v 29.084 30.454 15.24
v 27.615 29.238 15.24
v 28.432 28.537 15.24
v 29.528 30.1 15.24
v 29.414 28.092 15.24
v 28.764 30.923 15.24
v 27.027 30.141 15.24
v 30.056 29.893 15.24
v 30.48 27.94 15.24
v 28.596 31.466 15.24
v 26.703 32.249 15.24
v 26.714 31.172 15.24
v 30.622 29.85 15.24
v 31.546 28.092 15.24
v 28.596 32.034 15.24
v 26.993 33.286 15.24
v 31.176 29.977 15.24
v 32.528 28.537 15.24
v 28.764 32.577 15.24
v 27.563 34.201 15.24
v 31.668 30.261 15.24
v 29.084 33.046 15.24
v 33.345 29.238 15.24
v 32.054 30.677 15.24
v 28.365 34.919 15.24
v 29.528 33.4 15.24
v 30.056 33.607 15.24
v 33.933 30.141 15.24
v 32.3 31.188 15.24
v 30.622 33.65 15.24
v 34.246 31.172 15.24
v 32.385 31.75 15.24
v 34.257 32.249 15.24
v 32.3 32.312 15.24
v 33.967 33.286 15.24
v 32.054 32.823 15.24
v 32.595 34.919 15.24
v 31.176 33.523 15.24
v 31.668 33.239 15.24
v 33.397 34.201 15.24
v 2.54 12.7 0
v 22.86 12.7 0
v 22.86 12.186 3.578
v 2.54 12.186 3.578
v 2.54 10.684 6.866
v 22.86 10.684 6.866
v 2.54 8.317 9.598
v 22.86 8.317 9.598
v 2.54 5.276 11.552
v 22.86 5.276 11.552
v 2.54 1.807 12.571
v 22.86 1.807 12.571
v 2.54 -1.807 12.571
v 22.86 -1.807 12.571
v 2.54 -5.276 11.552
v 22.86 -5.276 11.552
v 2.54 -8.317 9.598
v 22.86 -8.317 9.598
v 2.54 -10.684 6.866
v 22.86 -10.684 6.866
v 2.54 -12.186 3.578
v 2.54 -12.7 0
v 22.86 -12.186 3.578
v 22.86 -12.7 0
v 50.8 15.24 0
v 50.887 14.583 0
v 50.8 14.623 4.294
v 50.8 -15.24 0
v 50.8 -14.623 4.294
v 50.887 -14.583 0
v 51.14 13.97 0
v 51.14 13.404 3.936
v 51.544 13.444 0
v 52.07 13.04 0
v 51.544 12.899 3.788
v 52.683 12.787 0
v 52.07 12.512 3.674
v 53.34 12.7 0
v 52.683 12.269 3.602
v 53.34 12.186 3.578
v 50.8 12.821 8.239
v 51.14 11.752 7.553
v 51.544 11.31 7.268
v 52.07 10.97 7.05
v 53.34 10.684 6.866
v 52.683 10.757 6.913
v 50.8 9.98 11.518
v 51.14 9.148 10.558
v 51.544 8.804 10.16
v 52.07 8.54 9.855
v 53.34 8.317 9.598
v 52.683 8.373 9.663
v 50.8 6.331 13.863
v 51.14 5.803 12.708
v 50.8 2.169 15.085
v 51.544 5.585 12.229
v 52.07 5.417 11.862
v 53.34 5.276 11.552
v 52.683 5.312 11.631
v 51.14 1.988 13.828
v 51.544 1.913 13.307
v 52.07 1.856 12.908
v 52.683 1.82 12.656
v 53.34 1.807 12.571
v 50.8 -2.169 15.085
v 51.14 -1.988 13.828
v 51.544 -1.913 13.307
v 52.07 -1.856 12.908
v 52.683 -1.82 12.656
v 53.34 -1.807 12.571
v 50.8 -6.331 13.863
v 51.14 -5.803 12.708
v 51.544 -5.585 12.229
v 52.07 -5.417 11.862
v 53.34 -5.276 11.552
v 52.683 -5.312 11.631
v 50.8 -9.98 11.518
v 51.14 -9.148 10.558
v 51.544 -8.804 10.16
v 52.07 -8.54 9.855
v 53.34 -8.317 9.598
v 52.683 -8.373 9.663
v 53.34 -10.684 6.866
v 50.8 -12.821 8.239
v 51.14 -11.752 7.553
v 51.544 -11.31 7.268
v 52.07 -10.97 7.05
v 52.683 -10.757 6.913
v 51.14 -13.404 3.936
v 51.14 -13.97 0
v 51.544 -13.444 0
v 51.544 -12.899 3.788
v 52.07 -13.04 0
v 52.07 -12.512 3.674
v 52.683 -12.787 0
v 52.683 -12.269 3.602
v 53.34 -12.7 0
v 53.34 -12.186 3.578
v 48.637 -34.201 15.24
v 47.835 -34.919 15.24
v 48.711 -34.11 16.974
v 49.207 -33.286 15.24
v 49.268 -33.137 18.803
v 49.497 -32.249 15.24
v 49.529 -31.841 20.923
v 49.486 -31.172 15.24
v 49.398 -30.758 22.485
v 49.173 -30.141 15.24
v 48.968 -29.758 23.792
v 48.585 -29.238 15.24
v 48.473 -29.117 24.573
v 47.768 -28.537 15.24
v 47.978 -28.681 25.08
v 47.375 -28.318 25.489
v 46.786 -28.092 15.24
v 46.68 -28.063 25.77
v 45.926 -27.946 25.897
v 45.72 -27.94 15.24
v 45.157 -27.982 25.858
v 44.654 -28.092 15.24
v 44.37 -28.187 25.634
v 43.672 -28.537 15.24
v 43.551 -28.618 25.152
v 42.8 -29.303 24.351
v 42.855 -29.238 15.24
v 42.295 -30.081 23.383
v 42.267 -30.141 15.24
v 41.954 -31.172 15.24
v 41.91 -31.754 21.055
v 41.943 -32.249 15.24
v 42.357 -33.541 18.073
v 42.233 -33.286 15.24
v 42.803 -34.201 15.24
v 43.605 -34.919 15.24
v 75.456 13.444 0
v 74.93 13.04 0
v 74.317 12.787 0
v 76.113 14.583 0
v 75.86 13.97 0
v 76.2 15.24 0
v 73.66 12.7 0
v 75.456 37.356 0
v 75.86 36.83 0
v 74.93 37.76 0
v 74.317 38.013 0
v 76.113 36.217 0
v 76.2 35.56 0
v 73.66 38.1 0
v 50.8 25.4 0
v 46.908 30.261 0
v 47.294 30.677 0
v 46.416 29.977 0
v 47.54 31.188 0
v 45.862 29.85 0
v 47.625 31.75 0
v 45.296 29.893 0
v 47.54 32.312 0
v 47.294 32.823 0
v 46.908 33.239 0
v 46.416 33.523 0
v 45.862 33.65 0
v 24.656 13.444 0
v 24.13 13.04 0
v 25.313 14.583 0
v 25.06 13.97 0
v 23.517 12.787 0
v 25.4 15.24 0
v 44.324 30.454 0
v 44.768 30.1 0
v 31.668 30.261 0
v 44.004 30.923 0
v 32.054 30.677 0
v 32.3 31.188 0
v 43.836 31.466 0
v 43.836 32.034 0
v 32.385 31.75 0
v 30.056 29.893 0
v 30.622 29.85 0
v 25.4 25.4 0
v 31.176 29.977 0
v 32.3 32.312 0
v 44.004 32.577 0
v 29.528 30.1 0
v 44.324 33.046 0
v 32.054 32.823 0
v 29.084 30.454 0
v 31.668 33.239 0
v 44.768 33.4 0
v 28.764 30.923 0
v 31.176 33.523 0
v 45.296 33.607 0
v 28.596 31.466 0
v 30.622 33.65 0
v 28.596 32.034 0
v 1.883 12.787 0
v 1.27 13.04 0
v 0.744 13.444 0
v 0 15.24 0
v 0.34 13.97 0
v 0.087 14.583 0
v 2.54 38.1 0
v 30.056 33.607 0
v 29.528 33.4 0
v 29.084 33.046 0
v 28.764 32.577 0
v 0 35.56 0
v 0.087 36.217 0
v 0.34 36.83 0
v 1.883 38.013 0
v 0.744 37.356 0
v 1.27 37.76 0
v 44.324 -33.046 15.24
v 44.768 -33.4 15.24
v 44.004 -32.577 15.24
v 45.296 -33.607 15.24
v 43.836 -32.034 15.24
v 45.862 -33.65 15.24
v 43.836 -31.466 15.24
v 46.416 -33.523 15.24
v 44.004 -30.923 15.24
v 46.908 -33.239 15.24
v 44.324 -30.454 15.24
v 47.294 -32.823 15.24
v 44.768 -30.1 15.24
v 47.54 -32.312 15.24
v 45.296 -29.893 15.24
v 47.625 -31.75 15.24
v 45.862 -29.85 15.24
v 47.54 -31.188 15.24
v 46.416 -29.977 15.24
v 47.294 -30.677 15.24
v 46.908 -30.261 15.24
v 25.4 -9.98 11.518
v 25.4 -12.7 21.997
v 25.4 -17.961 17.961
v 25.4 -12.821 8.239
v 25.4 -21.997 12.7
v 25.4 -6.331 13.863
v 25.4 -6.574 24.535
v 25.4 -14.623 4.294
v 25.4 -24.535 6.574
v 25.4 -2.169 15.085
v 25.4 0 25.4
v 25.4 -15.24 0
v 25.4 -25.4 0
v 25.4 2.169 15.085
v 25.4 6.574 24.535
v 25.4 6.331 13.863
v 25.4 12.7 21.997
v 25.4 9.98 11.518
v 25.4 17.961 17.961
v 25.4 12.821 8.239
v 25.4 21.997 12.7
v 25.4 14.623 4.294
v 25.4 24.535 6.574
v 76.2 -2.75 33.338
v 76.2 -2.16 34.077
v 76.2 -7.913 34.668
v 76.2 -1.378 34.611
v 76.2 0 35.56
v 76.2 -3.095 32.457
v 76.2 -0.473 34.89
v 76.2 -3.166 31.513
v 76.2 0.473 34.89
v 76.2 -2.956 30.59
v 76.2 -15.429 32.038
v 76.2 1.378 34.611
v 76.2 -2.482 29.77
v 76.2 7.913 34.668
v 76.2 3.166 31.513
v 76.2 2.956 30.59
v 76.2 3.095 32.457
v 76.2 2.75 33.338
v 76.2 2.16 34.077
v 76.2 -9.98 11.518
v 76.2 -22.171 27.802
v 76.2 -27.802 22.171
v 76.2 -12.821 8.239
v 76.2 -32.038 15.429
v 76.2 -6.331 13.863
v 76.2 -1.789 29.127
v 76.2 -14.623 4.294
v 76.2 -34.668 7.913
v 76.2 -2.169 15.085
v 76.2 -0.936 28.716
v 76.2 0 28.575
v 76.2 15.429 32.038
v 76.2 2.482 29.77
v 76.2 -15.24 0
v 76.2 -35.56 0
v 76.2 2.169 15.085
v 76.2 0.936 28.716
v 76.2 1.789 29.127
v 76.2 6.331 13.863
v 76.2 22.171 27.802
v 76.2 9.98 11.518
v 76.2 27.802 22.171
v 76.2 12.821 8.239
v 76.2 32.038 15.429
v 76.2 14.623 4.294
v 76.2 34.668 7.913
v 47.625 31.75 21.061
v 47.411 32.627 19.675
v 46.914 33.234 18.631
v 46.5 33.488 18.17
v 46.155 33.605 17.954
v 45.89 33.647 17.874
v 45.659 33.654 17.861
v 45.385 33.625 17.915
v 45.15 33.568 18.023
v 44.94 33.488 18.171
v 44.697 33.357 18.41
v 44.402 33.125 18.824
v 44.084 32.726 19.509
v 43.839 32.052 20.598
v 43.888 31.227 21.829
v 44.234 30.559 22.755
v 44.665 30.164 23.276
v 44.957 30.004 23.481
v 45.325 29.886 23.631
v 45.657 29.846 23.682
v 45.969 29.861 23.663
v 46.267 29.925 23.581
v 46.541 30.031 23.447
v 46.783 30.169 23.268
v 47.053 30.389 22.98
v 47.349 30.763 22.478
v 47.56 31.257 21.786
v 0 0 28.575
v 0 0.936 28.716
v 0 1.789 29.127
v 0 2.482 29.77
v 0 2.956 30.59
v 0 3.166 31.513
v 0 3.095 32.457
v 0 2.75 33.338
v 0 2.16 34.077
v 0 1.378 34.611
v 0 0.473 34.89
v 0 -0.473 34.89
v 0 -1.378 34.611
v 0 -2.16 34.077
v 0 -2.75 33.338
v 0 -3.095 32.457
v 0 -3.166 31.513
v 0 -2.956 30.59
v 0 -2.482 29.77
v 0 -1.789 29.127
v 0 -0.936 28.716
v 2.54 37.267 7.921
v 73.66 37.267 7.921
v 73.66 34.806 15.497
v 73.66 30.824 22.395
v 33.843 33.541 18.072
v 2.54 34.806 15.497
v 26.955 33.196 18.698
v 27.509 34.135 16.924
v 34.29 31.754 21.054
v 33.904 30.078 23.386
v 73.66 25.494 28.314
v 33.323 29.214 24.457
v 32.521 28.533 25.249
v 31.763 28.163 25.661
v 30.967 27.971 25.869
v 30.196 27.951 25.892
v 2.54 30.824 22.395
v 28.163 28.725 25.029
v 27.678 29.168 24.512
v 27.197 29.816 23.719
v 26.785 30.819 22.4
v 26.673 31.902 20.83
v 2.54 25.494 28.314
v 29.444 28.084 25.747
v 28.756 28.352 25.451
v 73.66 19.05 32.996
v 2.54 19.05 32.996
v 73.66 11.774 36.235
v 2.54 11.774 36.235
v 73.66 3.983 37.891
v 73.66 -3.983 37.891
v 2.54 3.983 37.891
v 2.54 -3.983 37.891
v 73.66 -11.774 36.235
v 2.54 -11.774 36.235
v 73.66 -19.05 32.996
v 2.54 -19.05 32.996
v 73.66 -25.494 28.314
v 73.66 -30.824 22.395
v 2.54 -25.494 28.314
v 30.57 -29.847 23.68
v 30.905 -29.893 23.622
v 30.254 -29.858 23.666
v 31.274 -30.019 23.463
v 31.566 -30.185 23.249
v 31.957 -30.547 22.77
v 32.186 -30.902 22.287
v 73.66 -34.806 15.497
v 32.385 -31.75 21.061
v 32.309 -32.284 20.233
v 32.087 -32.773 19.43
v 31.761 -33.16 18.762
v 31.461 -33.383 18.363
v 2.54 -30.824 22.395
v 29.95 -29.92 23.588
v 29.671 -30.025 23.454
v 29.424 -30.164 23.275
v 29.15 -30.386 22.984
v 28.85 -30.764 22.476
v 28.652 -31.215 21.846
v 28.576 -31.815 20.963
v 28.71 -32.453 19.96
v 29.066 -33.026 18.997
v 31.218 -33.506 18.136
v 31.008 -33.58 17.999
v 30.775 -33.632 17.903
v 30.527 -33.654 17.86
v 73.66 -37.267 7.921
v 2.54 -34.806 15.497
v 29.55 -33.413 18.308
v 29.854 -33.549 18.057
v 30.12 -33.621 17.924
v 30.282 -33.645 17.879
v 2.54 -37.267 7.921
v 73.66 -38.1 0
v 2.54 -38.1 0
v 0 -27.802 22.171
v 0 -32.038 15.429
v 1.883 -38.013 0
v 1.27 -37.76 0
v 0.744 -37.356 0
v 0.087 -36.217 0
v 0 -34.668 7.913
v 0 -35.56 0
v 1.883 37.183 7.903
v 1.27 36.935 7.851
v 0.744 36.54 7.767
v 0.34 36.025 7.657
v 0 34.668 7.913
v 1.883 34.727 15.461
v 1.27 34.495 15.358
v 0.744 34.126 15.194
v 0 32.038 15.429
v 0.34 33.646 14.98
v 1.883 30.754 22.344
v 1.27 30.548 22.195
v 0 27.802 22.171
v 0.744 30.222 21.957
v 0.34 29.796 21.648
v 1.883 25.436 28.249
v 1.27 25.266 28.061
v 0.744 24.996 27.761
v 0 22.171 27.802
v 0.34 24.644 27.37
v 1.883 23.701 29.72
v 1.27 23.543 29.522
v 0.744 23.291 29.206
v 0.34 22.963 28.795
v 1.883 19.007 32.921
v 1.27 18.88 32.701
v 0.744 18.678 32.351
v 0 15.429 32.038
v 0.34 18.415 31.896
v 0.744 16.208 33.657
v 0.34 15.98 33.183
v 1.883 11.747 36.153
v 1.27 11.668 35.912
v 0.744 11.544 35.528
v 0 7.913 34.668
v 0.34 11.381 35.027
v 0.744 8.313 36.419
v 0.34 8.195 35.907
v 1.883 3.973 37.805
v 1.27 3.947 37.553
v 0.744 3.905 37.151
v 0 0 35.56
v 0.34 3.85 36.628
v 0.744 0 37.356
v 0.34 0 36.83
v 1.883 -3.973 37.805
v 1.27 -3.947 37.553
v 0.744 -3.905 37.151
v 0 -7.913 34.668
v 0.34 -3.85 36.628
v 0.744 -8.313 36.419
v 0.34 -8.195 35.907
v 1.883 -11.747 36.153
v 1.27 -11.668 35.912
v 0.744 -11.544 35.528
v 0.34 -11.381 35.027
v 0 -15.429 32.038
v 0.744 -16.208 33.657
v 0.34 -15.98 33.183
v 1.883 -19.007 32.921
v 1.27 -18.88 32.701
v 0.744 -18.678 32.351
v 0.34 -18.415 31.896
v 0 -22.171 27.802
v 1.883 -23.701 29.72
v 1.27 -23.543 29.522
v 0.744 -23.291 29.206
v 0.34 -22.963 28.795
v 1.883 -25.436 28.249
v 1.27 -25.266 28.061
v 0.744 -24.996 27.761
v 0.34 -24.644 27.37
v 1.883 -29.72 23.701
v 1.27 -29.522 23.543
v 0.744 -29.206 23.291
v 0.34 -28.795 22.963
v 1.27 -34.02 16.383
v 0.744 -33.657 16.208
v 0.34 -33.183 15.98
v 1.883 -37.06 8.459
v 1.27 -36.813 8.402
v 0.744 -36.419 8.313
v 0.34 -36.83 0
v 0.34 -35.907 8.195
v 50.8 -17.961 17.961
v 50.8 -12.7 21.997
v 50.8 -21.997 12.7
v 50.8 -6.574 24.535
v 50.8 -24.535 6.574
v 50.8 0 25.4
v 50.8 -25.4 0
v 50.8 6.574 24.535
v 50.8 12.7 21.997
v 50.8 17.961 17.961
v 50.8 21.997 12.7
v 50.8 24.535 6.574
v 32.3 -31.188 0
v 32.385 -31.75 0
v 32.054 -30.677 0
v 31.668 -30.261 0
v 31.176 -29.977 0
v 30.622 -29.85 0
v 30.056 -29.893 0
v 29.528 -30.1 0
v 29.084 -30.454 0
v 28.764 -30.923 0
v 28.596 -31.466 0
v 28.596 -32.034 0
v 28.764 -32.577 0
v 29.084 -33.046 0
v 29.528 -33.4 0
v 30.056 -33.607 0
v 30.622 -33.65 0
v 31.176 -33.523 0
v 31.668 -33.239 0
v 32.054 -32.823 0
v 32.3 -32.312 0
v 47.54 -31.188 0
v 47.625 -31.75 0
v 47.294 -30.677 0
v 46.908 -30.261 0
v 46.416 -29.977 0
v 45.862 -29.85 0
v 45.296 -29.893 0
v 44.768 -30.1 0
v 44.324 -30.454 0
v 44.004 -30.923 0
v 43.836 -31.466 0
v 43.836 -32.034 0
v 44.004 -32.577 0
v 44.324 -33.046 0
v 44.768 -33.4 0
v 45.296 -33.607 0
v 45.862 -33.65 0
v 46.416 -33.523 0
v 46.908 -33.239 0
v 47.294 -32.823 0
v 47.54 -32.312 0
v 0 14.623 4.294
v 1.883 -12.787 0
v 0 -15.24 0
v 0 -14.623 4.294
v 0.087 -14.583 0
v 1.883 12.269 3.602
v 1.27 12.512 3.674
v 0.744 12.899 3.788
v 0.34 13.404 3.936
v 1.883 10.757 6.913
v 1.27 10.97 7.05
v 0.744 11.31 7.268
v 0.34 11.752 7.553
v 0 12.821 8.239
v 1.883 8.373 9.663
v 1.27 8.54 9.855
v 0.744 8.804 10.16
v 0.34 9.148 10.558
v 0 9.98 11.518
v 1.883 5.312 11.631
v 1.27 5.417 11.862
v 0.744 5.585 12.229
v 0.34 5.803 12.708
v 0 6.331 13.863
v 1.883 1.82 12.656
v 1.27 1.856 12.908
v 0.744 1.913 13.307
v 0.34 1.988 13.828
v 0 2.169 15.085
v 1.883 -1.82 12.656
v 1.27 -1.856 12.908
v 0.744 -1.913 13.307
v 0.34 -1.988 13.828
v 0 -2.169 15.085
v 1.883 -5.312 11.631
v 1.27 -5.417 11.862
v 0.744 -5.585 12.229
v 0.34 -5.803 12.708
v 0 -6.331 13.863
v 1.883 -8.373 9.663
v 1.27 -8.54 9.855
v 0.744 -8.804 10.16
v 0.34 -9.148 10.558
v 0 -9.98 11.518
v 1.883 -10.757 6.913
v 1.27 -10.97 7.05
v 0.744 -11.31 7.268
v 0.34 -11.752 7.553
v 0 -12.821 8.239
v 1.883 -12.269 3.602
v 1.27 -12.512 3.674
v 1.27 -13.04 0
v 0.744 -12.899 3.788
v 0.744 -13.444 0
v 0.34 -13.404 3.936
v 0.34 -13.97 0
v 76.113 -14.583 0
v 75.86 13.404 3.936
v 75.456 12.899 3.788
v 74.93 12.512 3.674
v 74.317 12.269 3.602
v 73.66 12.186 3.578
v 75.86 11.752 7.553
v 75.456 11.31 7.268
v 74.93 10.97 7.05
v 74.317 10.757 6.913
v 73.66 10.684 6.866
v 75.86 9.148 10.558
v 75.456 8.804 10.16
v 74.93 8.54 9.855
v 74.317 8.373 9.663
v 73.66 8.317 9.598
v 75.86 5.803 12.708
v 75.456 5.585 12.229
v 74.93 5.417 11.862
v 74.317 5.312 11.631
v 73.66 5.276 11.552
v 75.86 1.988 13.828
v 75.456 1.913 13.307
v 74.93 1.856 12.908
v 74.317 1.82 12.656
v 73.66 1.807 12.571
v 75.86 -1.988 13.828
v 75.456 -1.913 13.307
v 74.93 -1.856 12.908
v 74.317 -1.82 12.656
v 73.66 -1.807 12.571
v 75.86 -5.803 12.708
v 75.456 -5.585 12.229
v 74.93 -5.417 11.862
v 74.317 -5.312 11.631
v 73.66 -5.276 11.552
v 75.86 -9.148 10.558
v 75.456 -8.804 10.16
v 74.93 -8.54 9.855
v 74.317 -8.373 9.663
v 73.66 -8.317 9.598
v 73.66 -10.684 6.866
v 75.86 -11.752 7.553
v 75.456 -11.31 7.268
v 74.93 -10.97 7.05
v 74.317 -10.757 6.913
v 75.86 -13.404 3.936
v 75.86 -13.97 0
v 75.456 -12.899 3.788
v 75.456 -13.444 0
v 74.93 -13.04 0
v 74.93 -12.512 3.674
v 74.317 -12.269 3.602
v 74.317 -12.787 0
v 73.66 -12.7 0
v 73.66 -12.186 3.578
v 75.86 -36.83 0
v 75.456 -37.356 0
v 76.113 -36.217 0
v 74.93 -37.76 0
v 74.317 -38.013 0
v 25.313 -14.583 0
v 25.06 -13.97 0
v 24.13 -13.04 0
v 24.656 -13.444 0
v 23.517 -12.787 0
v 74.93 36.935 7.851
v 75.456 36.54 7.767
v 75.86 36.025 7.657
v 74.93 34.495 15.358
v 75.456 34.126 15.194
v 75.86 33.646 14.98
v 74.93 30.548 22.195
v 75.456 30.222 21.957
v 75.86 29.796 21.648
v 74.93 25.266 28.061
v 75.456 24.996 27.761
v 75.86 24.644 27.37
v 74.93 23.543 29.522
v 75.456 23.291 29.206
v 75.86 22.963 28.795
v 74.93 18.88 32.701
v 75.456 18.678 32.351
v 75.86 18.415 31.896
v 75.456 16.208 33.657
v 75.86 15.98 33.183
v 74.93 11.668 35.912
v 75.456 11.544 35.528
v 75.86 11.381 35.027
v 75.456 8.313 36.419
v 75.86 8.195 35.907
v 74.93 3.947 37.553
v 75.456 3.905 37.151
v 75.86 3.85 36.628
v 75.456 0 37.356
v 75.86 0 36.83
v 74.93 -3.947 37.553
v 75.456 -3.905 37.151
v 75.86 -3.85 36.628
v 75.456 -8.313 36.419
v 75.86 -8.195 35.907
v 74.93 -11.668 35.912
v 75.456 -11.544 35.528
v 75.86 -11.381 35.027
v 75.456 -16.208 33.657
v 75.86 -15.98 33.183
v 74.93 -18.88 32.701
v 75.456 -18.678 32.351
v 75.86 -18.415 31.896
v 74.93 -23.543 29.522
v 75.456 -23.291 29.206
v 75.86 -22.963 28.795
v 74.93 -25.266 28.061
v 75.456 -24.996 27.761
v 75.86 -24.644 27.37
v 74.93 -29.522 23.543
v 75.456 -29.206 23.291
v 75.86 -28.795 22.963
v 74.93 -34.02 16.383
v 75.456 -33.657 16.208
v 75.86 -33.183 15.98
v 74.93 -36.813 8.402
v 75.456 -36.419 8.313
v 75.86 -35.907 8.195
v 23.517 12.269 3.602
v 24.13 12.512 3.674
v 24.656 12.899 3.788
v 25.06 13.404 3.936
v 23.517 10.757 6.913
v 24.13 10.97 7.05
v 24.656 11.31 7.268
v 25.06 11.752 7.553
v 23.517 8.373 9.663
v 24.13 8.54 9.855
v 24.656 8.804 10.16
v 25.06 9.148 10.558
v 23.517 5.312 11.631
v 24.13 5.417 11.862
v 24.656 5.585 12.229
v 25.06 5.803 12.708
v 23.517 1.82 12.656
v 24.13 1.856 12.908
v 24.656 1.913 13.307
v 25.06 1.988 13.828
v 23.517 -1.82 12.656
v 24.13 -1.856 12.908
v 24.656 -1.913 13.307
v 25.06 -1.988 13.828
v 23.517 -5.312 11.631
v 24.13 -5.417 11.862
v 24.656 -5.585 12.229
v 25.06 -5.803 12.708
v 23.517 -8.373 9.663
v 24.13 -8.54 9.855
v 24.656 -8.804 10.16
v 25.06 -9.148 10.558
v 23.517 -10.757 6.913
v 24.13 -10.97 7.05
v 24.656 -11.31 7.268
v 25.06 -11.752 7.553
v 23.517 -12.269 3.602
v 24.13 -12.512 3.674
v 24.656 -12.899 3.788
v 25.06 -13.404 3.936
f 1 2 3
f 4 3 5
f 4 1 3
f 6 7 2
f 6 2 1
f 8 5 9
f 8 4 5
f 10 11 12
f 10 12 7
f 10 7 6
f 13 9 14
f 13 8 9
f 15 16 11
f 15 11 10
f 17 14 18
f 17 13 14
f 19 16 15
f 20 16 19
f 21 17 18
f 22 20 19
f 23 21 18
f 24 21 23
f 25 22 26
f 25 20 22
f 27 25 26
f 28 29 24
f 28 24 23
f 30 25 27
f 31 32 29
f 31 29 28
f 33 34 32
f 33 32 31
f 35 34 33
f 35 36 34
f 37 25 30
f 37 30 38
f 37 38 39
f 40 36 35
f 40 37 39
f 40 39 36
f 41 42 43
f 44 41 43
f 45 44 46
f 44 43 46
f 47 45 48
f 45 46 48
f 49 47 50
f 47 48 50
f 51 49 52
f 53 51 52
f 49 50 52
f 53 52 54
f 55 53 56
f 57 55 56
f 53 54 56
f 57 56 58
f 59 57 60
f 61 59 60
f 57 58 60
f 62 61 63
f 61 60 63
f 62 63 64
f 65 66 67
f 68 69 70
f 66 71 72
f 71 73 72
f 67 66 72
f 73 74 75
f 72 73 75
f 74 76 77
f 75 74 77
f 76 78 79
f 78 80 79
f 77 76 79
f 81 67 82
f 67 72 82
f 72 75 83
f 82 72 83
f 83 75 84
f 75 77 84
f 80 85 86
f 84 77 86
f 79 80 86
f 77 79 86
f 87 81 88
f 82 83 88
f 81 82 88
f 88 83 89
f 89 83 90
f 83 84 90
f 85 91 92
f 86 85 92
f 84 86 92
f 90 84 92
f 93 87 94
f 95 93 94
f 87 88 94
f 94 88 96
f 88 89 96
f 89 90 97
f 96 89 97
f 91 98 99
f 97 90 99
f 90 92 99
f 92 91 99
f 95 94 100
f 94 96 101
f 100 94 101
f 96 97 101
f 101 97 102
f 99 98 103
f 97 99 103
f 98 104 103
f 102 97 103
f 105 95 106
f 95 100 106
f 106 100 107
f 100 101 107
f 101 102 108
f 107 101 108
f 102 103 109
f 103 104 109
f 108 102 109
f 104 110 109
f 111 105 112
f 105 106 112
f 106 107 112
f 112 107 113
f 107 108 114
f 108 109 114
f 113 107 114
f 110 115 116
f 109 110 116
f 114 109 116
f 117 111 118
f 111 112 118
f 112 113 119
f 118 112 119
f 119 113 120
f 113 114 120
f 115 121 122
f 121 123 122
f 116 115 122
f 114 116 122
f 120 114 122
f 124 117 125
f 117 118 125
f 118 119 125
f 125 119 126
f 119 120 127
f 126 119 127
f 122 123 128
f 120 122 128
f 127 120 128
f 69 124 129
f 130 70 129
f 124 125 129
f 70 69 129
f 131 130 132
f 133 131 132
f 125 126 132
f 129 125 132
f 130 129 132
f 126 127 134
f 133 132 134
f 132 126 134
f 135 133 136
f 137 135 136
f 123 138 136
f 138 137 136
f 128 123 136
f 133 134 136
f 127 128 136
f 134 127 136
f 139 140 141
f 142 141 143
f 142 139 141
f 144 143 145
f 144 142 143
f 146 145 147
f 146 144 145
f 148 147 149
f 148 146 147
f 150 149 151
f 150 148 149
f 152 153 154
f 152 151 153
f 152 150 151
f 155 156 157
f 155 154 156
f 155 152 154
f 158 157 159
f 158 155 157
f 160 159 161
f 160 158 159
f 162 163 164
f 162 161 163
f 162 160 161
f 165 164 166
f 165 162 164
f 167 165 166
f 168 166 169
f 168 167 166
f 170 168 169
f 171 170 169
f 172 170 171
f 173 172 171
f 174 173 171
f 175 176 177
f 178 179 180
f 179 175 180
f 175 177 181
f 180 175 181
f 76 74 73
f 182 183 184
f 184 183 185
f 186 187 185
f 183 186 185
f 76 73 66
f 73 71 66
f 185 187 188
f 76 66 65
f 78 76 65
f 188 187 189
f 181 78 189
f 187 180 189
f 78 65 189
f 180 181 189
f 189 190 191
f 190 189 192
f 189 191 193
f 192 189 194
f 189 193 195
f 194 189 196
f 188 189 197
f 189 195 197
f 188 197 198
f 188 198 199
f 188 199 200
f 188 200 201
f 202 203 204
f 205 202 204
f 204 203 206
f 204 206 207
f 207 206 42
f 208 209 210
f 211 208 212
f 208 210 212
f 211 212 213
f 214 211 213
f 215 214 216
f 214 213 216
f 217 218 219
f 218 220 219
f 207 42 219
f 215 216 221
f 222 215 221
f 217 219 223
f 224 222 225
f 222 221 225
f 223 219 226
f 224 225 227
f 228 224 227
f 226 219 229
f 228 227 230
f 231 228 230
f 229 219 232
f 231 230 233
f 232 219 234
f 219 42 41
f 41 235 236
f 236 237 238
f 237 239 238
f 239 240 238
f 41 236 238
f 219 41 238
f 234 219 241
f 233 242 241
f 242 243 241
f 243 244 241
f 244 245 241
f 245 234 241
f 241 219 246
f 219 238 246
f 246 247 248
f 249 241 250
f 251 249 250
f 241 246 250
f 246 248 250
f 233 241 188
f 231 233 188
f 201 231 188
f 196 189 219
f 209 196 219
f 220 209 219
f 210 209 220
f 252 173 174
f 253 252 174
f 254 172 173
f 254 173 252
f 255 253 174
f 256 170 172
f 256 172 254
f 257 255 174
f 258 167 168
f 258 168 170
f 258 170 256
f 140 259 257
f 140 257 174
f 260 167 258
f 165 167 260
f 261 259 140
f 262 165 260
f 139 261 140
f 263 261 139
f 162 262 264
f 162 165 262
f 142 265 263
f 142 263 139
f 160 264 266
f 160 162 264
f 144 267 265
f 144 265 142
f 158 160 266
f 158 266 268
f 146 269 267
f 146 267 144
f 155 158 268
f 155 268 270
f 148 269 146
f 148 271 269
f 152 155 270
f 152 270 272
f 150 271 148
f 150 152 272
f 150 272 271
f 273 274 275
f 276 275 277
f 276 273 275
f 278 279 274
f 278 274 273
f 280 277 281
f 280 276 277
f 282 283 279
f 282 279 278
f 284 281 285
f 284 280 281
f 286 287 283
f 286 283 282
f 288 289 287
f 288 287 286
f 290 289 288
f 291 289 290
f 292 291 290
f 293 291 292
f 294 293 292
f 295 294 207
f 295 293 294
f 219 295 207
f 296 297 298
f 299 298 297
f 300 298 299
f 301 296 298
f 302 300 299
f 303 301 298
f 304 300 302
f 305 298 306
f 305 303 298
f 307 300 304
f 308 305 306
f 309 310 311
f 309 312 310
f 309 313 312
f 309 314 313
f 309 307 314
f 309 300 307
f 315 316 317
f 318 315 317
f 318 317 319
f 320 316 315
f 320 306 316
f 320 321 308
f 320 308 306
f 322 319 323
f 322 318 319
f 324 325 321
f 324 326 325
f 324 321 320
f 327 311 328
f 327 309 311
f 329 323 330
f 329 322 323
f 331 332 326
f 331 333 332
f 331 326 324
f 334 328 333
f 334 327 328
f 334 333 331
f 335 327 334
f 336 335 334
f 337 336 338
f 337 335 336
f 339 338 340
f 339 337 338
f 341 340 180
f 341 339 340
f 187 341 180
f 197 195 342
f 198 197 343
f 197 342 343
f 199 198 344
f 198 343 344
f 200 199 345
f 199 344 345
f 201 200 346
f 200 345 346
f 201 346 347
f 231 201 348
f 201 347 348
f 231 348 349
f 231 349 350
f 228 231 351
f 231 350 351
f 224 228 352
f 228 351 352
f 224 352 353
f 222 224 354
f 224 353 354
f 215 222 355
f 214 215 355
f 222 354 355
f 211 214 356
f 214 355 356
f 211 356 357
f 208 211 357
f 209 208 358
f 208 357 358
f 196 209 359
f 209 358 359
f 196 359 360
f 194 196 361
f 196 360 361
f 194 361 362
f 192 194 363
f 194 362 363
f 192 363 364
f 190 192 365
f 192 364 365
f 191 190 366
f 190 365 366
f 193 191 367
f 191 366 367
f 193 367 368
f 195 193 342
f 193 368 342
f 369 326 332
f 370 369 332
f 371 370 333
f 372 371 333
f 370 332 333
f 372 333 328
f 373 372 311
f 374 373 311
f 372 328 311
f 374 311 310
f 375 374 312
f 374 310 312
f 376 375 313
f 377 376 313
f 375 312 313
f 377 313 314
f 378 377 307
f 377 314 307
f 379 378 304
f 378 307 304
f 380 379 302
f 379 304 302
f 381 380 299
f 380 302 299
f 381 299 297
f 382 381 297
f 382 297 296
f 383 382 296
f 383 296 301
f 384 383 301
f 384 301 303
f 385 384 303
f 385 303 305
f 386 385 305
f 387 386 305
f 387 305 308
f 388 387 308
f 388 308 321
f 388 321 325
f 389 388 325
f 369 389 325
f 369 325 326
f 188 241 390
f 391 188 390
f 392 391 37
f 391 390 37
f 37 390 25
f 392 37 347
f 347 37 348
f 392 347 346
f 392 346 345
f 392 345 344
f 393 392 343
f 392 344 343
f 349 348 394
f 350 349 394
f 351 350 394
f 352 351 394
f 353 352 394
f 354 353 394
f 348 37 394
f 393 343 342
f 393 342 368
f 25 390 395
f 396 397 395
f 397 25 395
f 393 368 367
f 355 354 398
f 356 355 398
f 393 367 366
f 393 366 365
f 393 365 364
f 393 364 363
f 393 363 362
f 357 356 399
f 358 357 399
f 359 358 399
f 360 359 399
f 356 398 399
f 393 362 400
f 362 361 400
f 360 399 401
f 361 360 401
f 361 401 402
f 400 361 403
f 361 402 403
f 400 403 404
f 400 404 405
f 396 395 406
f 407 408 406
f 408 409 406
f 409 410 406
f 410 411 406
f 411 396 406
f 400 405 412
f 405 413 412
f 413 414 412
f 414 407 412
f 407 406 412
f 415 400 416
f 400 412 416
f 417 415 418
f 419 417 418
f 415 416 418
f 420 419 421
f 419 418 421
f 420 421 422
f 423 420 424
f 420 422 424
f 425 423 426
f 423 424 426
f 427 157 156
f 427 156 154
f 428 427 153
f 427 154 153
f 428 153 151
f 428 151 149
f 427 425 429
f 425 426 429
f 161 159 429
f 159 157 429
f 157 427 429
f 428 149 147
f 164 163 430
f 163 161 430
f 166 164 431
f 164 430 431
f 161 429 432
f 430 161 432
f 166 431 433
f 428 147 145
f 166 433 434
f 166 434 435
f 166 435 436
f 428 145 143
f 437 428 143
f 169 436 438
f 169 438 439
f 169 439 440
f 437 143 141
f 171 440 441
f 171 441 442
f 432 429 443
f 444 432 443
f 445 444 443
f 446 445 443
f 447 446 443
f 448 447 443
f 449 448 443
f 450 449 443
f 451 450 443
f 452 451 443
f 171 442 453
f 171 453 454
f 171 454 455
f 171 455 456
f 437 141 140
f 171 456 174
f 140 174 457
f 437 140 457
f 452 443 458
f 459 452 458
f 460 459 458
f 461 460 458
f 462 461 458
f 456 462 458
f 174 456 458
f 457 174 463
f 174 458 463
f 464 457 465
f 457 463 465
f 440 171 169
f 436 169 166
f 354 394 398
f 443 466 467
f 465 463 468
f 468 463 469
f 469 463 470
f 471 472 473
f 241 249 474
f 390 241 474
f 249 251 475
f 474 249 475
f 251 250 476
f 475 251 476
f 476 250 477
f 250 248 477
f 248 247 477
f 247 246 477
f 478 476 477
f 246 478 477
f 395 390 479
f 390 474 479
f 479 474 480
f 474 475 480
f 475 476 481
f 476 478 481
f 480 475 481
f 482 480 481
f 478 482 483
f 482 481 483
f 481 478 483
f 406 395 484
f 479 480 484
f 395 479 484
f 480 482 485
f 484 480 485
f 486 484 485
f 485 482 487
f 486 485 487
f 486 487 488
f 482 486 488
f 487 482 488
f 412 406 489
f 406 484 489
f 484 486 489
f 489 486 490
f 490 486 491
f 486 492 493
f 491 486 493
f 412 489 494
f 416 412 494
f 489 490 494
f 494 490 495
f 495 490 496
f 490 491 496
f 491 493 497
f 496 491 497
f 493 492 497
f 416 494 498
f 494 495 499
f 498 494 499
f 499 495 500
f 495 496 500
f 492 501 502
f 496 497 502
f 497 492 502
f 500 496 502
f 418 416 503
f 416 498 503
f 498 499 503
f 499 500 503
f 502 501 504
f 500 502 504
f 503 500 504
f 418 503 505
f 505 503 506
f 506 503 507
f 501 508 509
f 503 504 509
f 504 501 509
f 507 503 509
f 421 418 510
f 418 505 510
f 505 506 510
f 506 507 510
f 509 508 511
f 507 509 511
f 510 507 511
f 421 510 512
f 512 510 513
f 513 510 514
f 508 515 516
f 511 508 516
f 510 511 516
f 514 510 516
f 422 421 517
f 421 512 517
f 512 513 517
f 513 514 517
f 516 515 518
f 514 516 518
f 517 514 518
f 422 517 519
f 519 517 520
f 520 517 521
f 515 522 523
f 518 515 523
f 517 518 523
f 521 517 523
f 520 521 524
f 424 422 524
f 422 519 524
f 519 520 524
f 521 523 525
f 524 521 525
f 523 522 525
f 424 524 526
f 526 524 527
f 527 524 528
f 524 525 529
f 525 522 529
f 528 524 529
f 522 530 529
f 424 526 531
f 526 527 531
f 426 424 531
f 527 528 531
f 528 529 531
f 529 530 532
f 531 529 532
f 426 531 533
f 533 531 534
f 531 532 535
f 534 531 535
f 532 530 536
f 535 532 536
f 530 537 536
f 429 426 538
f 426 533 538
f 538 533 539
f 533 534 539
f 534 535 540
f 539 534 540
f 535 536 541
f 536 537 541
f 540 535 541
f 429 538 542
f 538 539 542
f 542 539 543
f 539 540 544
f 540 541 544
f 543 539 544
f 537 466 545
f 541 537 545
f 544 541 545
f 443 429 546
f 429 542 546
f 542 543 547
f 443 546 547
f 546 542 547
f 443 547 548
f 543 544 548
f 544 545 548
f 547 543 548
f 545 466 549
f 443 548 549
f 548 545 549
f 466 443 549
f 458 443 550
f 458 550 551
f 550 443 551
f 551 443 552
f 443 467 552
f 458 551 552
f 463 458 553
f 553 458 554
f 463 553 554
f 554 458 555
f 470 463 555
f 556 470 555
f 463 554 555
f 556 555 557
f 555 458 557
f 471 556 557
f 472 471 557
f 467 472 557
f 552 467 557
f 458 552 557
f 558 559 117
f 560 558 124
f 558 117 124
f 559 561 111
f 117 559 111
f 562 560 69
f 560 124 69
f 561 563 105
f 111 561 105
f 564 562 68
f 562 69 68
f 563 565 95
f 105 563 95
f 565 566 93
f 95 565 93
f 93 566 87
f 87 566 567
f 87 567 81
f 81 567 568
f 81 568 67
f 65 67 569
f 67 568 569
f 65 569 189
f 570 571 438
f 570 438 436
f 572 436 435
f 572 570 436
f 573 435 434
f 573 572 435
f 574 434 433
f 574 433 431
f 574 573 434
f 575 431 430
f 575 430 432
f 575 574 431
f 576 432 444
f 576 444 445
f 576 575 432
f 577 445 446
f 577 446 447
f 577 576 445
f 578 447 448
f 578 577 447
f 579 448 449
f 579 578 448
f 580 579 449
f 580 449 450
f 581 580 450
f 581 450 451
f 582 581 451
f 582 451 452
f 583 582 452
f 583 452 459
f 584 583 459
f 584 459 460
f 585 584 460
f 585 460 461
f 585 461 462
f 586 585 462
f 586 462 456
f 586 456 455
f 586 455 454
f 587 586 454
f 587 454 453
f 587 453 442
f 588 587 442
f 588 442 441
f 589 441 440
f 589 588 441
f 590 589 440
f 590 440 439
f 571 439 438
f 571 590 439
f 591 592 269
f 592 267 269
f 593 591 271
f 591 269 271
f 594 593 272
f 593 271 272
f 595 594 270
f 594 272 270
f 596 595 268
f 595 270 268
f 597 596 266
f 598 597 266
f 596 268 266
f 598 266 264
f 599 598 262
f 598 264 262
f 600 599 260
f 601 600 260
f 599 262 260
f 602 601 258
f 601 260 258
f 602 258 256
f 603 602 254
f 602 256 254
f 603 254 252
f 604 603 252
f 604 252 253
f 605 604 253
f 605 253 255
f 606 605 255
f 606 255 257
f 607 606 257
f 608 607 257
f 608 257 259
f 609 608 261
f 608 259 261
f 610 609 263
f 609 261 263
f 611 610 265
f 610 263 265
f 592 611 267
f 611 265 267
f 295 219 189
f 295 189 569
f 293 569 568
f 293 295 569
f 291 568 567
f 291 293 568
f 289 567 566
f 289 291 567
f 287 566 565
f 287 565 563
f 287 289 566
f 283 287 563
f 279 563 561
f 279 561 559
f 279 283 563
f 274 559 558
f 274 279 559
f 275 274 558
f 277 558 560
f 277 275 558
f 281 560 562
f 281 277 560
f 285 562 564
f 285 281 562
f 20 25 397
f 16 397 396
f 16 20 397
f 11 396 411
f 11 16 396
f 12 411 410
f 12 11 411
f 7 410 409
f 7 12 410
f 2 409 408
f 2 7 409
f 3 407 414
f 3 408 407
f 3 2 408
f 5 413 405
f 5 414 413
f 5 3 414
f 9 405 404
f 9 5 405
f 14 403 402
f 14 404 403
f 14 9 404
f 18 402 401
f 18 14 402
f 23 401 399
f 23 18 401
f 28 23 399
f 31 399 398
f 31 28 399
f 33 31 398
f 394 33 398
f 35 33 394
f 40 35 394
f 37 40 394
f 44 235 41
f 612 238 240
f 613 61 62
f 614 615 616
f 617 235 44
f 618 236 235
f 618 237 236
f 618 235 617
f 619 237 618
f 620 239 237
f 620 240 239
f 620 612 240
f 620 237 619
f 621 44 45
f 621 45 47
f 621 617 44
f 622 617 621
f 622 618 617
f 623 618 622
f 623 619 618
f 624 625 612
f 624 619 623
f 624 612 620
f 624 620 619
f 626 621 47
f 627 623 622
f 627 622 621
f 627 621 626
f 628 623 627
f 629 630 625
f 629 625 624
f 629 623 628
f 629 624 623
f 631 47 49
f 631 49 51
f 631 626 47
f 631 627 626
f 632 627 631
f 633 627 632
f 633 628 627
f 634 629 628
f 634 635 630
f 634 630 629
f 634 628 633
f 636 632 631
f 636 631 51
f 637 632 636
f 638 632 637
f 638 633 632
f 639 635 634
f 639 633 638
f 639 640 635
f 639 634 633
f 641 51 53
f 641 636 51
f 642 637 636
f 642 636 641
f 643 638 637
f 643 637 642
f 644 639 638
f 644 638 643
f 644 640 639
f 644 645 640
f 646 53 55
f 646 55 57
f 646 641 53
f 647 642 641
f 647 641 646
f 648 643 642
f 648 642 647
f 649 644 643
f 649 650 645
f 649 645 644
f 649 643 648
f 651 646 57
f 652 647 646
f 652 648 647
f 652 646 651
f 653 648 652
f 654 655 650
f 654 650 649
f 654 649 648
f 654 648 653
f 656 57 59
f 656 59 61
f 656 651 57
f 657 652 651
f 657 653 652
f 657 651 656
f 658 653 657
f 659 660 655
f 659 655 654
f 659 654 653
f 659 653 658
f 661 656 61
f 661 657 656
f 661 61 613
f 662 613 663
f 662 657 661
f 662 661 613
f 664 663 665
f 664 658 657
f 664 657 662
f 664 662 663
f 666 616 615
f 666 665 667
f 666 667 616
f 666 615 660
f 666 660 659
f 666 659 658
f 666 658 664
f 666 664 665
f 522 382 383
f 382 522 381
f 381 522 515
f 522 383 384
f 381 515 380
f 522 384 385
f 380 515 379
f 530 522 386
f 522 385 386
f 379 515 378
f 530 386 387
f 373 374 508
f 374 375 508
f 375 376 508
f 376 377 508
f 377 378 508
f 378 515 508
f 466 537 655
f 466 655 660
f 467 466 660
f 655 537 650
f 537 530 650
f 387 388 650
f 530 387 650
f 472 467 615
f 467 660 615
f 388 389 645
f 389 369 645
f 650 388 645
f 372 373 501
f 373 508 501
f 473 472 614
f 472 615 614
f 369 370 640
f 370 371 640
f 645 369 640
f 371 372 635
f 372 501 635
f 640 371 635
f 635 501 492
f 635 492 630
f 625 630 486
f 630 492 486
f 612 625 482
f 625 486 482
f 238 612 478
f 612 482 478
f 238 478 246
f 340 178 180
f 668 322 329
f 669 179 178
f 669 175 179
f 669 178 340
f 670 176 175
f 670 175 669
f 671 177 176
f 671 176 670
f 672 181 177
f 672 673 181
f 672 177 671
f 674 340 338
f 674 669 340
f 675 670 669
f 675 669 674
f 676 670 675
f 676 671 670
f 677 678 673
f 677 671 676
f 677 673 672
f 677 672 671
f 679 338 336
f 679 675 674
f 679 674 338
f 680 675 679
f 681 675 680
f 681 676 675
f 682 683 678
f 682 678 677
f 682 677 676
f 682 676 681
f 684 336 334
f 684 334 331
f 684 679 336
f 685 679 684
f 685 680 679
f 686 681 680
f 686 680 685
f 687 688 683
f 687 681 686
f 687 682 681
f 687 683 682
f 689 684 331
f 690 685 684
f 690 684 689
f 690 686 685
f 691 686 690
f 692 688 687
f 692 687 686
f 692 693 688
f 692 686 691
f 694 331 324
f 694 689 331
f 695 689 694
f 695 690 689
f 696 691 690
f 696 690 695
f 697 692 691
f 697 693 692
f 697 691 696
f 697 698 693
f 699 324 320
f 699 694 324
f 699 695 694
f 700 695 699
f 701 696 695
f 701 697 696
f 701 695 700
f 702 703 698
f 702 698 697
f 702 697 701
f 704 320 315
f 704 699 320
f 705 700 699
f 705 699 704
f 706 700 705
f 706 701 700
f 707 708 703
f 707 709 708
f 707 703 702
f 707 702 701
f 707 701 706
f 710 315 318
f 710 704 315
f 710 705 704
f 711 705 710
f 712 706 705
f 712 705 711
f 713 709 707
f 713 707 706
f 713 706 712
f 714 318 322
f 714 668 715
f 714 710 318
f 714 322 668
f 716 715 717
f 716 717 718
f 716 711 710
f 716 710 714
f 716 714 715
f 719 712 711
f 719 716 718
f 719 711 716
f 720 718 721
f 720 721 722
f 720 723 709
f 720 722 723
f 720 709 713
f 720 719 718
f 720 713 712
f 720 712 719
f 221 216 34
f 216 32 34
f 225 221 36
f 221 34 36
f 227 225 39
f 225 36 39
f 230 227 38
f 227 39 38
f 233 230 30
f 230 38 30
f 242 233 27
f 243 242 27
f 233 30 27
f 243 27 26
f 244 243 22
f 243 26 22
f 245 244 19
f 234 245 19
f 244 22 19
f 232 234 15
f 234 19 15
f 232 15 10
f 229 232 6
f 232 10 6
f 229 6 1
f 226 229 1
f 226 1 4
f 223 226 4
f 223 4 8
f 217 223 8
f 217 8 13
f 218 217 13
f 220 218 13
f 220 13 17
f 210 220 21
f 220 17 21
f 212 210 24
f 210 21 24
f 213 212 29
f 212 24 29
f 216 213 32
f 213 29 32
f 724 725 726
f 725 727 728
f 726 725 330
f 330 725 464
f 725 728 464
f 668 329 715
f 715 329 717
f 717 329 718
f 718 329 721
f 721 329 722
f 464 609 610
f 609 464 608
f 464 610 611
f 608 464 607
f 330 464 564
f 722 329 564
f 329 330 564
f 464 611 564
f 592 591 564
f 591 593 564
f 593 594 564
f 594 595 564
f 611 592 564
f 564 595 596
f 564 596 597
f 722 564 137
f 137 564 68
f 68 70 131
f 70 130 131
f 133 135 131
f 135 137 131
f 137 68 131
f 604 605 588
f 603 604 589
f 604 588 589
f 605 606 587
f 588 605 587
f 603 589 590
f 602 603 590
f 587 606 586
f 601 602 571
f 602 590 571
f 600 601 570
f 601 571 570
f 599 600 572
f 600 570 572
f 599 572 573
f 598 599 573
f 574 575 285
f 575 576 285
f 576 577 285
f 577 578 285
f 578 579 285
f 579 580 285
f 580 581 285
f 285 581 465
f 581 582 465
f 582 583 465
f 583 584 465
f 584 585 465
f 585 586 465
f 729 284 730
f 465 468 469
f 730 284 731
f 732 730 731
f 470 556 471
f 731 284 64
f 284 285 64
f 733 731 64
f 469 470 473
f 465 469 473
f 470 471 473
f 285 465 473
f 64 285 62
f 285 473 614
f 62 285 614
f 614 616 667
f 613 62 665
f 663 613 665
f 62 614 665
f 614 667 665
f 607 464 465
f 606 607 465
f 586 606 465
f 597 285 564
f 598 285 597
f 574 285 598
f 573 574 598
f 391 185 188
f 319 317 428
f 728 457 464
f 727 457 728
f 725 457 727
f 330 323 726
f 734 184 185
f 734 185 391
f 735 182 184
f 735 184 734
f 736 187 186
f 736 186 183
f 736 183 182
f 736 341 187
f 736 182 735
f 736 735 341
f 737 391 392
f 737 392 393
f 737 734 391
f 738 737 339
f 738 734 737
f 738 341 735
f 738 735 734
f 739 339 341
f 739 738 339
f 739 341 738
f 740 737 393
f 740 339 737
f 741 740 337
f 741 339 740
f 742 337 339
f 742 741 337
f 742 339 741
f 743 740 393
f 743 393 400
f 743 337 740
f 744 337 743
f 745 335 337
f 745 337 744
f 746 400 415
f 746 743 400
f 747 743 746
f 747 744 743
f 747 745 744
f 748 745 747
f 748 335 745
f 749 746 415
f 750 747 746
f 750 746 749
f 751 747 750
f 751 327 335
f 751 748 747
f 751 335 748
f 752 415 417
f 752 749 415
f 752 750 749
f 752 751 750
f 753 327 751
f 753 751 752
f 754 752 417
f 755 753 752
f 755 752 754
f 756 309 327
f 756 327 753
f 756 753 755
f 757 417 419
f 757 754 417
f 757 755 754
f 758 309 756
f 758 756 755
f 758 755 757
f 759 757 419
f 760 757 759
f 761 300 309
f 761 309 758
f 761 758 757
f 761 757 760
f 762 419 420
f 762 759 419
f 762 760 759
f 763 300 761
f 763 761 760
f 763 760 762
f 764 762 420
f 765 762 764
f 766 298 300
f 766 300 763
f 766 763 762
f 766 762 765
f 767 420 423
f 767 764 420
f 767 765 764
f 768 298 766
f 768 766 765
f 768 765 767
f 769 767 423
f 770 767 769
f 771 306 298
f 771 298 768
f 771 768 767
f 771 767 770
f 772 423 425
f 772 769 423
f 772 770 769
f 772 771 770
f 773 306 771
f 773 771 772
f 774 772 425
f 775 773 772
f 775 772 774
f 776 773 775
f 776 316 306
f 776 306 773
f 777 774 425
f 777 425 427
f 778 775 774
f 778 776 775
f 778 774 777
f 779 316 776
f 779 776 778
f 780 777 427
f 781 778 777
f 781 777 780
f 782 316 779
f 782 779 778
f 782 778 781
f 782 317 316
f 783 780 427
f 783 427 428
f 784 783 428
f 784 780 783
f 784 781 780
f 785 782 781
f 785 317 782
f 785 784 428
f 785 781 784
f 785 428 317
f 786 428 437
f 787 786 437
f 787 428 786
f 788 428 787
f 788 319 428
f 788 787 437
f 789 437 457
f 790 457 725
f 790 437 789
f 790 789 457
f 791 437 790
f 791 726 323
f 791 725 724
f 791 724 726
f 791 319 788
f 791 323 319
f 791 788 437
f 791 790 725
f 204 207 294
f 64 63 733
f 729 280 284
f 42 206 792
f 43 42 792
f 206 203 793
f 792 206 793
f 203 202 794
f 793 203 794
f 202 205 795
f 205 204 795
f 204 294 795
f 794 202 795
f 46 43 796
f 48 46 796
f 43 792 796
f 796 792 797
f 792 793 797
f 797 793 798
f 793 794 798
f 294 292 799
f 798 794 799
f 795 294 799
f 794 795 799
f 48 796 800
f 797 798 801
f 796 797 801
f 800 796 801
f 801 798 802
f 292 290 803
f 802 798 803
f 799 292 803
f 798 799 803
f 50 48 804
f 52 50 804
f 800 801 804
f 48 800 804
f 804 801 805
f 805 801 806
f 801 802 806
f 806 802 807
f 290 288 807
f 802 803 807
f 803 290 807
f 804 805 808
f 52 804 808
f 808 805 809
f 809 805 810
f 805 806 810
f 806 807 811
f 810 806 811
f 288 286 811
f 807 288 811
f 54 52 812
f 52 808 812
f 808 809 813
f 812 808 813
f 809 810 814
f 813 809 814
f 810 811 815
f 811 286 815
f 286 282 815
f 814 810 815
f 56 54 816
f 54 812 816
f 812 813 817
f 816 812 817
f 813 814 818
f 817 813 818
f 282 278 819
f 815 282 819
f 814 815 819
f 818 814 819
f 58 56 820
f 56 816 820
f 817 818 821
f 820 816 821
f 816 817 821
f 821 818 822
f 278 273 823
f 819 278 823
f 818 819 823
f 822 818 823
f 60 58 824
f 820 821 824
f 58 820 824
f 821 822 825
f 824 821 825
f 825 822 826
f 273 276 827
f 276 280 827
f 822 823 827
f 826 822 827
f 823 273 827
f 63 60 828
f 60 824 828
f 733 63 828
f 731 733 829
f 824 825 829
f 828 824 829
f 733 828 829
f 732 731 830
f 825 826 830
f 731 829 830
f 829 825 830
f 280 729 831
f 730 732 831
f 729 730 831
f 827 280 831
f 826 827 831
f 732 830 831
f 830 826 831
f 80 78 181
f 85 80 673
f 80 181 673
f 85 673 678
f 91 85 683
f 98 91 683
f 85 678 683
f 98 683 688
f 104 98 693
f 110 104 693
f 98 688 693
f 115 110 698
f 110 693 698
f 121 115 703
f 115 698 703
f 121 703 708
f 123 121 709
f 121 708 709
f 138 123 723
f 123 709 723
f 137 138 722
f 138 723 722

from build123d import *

# Parameters (mm, degrees)
SKETCH1_R               = 38.1
BOSS_EXTRUDE1_DEPTH     = 25.4
SKETCH2_R               = 38.1
SKETCH2_R_2             = 25.4
BOSS_EXTRUDE2_DEPTH     = 25.4
SKETCH3_R               = 38.1
BOSS_EXTRUDE3_DEPTH     = 25.4
SKETCH4_R               = 12.7
CUT_EXTRUDE1_DEPTH      = 77.2
FILLET1_R               = 2.54
SKETCH6_R               = 1.905
CUT_EXTRUDE2_DEPTH      = 39.1000001
CUT_EXTRUDE2_DEPTH_BACK = 39.1000001
SKETCH7_R               = 3.81
CUT_EXTRUDE3_DEPTH      = 25.4
SKETCH8_R               = 3.81
CUT_EXTRUDE4_DEPTH      = 25.4
CUT_EXTRUDE5_REACH      = 78.2
SKETCH9_W               = 50.8
SKETCH9_H               = 76.2
FILLET2_R               = 2.54
SKETCH10_R              = 3.175
CUT_EXTRUDE6_DEPTH      = 77.2
FILLET3_R               = 2.54


with BuildPart() as part:
    # Sketch1 → Boss-Extrude1 (new body)
    with BuildSketch(Plane(origin=(0, 0, 0), x_dir=(0, 0, -1), z_dir=(1, 0, 0))):
        Circle(SKETCH1_R)
    extrude(amount=BOSS_EXTRUDE1_DEPTH)

    # Sketch2 → Boss-Extrude2 (add)
    with BuildSketch(Plane(origin=(25.4, 0, 0), x_dir=(0, 0, -1), z_dir=(1, 0, 0))):
        Circle(SKETCH2_R)
        Circle(SKETCH2_R_2, mode=Mode.SUBTRACT)
    extrude(amount=BOSS_EXTRUDE2_DEPTH)

    # Sketch3 → Boss-Extrude3 (add)
    with BuildSketch(Plane(origin=(50.8, 0, 0), x_dir=(0, 0, -1), z_dir=(1, 0, 0))):
        Circle(SKETCH3_R)
    extrude(amount=BOSS_EXTRUDE3_DEPTH)

    # Sketch4 → Cut-Extrude1 (cut, through all)
    with BuildSketch(Plane(origin=(76.2, 0, 0), x_dir=(0, 0, -1), z_dir=(1, 0, 0))):
        Circle(SKETCH4_R)
    extrude(amount=-CUT_EXTRUDE1_DEPTH, mode=Mode.SUBTRACT)

    # Fillet1
    fillet1_edges = [part.edges().sort_by_distance(p)[0] for p in [
        (76.2, 0, 38.1),
        (0, 0, 38.1),
    ]]
    fillet(fillet1_edges, radius=FILLET1_R)

    # Sketch6 → Cut-Extrude2 (cut, two sides)
    with BuildSketch(Plane.XY) as cut_extrude2_sk:
        with Locations((30.48, 31.75)):
            Circle(SKETCH6_R)
        with Locations((45.72, 31.75)):
            Circle(SKETCH6_R)
        with Locations((30.48, -31.75)):
            Circle(SKETCH6_R)
        with Locations((45.72, -31.75)):
            Circle(SKETCH6_R)
    extrude(amount=CUT_EXTRUDE2_DEPTH, mode=Mode.SUBTRACT)
    extrude(cut_extrude2_sk.sketch, amount=-CUT_EXTRUDE2_DEPTH_BACK, mode=Mode.SUBTRACT)

    # Sketch7 → Cut-Extrude3 (cut)
    with BuildSketch(Plane.XY.offset(15.24)):
        with Locations((30.48, 31.75)):
            Circle(SKETCH7_R)
        with Locations((45.72, -31.75)):
            Circle(SKETCH7_R)
    extrude(amount=CUT_EXTRUDE3_DEPTH, mode=Mode.SUBTRACT)

    # Sketch8 → Cut-Extrude4 (cut)
    with BuildSketch(Plane.XY.offset(-15.24)):
        with Locations((45.72, 31.75)):
            Circle(SKETCH8_R)
        with Locations((30.48, -31.75)):
            Circle(SKETCH8_R)
    extrude(amount=-CUT_EXTRUDE4_DEPTH, mode=Mode.SUBTRACT)

    # Sketch9 → Cut-Extrude5 (cut, up to next)
    with BuildSketch(Plane.ZY, mode=Mode.PRIVATE) as cut_extrude5_sk1:
        with Locations((-25.4, 0)):
            Rectangle(SKETCH9_W, SKETCH9_H)
    cut_extrude5_tool1 = extrude(cut_extrude5_sk1.sketch, amount=-CUT_EXTRUDE5_REACH, mode=Mode.PRIVATE) & part.part
    add(cut_extrude5_tool1.solids().sort_by_distance((0, 0, -25.4))[0], mode=Mode.SUBTRACT)

    # Fillet2
    fillet2_edges = [part.edges().sort_by_distance(p)[0] for p in [
        (25.4, 0, 12.7),
        (50.8, 0, 12.7),
    ]]
    fillet(fillet2_edges, radius=FILLET2_R)

    # Sketch10 → Cut-Extrude6 (cut, through all)
    with BuildSketch(Plane(origin=(76.2, 0, 0), x_dir=(0, 0, -1), z_dir=(1, 0, 0))):
        with Locations((-31.75, 0)):
            Circle(SKETCH10_R)
    extrude(amount=-CUT_EXTRUDE6_DEPTH, mode=Mode.SUBTRACT)

    # Fillet3
    fillet3_edges = [part.edges().sort_by_distance(p)[0] for p in [
        (0, 0, 12.7),
        (76.2, 0, 12.7),
    ]]
    fillet(fillet3_edges, radius=FILLET3_R)


solid = part.part
